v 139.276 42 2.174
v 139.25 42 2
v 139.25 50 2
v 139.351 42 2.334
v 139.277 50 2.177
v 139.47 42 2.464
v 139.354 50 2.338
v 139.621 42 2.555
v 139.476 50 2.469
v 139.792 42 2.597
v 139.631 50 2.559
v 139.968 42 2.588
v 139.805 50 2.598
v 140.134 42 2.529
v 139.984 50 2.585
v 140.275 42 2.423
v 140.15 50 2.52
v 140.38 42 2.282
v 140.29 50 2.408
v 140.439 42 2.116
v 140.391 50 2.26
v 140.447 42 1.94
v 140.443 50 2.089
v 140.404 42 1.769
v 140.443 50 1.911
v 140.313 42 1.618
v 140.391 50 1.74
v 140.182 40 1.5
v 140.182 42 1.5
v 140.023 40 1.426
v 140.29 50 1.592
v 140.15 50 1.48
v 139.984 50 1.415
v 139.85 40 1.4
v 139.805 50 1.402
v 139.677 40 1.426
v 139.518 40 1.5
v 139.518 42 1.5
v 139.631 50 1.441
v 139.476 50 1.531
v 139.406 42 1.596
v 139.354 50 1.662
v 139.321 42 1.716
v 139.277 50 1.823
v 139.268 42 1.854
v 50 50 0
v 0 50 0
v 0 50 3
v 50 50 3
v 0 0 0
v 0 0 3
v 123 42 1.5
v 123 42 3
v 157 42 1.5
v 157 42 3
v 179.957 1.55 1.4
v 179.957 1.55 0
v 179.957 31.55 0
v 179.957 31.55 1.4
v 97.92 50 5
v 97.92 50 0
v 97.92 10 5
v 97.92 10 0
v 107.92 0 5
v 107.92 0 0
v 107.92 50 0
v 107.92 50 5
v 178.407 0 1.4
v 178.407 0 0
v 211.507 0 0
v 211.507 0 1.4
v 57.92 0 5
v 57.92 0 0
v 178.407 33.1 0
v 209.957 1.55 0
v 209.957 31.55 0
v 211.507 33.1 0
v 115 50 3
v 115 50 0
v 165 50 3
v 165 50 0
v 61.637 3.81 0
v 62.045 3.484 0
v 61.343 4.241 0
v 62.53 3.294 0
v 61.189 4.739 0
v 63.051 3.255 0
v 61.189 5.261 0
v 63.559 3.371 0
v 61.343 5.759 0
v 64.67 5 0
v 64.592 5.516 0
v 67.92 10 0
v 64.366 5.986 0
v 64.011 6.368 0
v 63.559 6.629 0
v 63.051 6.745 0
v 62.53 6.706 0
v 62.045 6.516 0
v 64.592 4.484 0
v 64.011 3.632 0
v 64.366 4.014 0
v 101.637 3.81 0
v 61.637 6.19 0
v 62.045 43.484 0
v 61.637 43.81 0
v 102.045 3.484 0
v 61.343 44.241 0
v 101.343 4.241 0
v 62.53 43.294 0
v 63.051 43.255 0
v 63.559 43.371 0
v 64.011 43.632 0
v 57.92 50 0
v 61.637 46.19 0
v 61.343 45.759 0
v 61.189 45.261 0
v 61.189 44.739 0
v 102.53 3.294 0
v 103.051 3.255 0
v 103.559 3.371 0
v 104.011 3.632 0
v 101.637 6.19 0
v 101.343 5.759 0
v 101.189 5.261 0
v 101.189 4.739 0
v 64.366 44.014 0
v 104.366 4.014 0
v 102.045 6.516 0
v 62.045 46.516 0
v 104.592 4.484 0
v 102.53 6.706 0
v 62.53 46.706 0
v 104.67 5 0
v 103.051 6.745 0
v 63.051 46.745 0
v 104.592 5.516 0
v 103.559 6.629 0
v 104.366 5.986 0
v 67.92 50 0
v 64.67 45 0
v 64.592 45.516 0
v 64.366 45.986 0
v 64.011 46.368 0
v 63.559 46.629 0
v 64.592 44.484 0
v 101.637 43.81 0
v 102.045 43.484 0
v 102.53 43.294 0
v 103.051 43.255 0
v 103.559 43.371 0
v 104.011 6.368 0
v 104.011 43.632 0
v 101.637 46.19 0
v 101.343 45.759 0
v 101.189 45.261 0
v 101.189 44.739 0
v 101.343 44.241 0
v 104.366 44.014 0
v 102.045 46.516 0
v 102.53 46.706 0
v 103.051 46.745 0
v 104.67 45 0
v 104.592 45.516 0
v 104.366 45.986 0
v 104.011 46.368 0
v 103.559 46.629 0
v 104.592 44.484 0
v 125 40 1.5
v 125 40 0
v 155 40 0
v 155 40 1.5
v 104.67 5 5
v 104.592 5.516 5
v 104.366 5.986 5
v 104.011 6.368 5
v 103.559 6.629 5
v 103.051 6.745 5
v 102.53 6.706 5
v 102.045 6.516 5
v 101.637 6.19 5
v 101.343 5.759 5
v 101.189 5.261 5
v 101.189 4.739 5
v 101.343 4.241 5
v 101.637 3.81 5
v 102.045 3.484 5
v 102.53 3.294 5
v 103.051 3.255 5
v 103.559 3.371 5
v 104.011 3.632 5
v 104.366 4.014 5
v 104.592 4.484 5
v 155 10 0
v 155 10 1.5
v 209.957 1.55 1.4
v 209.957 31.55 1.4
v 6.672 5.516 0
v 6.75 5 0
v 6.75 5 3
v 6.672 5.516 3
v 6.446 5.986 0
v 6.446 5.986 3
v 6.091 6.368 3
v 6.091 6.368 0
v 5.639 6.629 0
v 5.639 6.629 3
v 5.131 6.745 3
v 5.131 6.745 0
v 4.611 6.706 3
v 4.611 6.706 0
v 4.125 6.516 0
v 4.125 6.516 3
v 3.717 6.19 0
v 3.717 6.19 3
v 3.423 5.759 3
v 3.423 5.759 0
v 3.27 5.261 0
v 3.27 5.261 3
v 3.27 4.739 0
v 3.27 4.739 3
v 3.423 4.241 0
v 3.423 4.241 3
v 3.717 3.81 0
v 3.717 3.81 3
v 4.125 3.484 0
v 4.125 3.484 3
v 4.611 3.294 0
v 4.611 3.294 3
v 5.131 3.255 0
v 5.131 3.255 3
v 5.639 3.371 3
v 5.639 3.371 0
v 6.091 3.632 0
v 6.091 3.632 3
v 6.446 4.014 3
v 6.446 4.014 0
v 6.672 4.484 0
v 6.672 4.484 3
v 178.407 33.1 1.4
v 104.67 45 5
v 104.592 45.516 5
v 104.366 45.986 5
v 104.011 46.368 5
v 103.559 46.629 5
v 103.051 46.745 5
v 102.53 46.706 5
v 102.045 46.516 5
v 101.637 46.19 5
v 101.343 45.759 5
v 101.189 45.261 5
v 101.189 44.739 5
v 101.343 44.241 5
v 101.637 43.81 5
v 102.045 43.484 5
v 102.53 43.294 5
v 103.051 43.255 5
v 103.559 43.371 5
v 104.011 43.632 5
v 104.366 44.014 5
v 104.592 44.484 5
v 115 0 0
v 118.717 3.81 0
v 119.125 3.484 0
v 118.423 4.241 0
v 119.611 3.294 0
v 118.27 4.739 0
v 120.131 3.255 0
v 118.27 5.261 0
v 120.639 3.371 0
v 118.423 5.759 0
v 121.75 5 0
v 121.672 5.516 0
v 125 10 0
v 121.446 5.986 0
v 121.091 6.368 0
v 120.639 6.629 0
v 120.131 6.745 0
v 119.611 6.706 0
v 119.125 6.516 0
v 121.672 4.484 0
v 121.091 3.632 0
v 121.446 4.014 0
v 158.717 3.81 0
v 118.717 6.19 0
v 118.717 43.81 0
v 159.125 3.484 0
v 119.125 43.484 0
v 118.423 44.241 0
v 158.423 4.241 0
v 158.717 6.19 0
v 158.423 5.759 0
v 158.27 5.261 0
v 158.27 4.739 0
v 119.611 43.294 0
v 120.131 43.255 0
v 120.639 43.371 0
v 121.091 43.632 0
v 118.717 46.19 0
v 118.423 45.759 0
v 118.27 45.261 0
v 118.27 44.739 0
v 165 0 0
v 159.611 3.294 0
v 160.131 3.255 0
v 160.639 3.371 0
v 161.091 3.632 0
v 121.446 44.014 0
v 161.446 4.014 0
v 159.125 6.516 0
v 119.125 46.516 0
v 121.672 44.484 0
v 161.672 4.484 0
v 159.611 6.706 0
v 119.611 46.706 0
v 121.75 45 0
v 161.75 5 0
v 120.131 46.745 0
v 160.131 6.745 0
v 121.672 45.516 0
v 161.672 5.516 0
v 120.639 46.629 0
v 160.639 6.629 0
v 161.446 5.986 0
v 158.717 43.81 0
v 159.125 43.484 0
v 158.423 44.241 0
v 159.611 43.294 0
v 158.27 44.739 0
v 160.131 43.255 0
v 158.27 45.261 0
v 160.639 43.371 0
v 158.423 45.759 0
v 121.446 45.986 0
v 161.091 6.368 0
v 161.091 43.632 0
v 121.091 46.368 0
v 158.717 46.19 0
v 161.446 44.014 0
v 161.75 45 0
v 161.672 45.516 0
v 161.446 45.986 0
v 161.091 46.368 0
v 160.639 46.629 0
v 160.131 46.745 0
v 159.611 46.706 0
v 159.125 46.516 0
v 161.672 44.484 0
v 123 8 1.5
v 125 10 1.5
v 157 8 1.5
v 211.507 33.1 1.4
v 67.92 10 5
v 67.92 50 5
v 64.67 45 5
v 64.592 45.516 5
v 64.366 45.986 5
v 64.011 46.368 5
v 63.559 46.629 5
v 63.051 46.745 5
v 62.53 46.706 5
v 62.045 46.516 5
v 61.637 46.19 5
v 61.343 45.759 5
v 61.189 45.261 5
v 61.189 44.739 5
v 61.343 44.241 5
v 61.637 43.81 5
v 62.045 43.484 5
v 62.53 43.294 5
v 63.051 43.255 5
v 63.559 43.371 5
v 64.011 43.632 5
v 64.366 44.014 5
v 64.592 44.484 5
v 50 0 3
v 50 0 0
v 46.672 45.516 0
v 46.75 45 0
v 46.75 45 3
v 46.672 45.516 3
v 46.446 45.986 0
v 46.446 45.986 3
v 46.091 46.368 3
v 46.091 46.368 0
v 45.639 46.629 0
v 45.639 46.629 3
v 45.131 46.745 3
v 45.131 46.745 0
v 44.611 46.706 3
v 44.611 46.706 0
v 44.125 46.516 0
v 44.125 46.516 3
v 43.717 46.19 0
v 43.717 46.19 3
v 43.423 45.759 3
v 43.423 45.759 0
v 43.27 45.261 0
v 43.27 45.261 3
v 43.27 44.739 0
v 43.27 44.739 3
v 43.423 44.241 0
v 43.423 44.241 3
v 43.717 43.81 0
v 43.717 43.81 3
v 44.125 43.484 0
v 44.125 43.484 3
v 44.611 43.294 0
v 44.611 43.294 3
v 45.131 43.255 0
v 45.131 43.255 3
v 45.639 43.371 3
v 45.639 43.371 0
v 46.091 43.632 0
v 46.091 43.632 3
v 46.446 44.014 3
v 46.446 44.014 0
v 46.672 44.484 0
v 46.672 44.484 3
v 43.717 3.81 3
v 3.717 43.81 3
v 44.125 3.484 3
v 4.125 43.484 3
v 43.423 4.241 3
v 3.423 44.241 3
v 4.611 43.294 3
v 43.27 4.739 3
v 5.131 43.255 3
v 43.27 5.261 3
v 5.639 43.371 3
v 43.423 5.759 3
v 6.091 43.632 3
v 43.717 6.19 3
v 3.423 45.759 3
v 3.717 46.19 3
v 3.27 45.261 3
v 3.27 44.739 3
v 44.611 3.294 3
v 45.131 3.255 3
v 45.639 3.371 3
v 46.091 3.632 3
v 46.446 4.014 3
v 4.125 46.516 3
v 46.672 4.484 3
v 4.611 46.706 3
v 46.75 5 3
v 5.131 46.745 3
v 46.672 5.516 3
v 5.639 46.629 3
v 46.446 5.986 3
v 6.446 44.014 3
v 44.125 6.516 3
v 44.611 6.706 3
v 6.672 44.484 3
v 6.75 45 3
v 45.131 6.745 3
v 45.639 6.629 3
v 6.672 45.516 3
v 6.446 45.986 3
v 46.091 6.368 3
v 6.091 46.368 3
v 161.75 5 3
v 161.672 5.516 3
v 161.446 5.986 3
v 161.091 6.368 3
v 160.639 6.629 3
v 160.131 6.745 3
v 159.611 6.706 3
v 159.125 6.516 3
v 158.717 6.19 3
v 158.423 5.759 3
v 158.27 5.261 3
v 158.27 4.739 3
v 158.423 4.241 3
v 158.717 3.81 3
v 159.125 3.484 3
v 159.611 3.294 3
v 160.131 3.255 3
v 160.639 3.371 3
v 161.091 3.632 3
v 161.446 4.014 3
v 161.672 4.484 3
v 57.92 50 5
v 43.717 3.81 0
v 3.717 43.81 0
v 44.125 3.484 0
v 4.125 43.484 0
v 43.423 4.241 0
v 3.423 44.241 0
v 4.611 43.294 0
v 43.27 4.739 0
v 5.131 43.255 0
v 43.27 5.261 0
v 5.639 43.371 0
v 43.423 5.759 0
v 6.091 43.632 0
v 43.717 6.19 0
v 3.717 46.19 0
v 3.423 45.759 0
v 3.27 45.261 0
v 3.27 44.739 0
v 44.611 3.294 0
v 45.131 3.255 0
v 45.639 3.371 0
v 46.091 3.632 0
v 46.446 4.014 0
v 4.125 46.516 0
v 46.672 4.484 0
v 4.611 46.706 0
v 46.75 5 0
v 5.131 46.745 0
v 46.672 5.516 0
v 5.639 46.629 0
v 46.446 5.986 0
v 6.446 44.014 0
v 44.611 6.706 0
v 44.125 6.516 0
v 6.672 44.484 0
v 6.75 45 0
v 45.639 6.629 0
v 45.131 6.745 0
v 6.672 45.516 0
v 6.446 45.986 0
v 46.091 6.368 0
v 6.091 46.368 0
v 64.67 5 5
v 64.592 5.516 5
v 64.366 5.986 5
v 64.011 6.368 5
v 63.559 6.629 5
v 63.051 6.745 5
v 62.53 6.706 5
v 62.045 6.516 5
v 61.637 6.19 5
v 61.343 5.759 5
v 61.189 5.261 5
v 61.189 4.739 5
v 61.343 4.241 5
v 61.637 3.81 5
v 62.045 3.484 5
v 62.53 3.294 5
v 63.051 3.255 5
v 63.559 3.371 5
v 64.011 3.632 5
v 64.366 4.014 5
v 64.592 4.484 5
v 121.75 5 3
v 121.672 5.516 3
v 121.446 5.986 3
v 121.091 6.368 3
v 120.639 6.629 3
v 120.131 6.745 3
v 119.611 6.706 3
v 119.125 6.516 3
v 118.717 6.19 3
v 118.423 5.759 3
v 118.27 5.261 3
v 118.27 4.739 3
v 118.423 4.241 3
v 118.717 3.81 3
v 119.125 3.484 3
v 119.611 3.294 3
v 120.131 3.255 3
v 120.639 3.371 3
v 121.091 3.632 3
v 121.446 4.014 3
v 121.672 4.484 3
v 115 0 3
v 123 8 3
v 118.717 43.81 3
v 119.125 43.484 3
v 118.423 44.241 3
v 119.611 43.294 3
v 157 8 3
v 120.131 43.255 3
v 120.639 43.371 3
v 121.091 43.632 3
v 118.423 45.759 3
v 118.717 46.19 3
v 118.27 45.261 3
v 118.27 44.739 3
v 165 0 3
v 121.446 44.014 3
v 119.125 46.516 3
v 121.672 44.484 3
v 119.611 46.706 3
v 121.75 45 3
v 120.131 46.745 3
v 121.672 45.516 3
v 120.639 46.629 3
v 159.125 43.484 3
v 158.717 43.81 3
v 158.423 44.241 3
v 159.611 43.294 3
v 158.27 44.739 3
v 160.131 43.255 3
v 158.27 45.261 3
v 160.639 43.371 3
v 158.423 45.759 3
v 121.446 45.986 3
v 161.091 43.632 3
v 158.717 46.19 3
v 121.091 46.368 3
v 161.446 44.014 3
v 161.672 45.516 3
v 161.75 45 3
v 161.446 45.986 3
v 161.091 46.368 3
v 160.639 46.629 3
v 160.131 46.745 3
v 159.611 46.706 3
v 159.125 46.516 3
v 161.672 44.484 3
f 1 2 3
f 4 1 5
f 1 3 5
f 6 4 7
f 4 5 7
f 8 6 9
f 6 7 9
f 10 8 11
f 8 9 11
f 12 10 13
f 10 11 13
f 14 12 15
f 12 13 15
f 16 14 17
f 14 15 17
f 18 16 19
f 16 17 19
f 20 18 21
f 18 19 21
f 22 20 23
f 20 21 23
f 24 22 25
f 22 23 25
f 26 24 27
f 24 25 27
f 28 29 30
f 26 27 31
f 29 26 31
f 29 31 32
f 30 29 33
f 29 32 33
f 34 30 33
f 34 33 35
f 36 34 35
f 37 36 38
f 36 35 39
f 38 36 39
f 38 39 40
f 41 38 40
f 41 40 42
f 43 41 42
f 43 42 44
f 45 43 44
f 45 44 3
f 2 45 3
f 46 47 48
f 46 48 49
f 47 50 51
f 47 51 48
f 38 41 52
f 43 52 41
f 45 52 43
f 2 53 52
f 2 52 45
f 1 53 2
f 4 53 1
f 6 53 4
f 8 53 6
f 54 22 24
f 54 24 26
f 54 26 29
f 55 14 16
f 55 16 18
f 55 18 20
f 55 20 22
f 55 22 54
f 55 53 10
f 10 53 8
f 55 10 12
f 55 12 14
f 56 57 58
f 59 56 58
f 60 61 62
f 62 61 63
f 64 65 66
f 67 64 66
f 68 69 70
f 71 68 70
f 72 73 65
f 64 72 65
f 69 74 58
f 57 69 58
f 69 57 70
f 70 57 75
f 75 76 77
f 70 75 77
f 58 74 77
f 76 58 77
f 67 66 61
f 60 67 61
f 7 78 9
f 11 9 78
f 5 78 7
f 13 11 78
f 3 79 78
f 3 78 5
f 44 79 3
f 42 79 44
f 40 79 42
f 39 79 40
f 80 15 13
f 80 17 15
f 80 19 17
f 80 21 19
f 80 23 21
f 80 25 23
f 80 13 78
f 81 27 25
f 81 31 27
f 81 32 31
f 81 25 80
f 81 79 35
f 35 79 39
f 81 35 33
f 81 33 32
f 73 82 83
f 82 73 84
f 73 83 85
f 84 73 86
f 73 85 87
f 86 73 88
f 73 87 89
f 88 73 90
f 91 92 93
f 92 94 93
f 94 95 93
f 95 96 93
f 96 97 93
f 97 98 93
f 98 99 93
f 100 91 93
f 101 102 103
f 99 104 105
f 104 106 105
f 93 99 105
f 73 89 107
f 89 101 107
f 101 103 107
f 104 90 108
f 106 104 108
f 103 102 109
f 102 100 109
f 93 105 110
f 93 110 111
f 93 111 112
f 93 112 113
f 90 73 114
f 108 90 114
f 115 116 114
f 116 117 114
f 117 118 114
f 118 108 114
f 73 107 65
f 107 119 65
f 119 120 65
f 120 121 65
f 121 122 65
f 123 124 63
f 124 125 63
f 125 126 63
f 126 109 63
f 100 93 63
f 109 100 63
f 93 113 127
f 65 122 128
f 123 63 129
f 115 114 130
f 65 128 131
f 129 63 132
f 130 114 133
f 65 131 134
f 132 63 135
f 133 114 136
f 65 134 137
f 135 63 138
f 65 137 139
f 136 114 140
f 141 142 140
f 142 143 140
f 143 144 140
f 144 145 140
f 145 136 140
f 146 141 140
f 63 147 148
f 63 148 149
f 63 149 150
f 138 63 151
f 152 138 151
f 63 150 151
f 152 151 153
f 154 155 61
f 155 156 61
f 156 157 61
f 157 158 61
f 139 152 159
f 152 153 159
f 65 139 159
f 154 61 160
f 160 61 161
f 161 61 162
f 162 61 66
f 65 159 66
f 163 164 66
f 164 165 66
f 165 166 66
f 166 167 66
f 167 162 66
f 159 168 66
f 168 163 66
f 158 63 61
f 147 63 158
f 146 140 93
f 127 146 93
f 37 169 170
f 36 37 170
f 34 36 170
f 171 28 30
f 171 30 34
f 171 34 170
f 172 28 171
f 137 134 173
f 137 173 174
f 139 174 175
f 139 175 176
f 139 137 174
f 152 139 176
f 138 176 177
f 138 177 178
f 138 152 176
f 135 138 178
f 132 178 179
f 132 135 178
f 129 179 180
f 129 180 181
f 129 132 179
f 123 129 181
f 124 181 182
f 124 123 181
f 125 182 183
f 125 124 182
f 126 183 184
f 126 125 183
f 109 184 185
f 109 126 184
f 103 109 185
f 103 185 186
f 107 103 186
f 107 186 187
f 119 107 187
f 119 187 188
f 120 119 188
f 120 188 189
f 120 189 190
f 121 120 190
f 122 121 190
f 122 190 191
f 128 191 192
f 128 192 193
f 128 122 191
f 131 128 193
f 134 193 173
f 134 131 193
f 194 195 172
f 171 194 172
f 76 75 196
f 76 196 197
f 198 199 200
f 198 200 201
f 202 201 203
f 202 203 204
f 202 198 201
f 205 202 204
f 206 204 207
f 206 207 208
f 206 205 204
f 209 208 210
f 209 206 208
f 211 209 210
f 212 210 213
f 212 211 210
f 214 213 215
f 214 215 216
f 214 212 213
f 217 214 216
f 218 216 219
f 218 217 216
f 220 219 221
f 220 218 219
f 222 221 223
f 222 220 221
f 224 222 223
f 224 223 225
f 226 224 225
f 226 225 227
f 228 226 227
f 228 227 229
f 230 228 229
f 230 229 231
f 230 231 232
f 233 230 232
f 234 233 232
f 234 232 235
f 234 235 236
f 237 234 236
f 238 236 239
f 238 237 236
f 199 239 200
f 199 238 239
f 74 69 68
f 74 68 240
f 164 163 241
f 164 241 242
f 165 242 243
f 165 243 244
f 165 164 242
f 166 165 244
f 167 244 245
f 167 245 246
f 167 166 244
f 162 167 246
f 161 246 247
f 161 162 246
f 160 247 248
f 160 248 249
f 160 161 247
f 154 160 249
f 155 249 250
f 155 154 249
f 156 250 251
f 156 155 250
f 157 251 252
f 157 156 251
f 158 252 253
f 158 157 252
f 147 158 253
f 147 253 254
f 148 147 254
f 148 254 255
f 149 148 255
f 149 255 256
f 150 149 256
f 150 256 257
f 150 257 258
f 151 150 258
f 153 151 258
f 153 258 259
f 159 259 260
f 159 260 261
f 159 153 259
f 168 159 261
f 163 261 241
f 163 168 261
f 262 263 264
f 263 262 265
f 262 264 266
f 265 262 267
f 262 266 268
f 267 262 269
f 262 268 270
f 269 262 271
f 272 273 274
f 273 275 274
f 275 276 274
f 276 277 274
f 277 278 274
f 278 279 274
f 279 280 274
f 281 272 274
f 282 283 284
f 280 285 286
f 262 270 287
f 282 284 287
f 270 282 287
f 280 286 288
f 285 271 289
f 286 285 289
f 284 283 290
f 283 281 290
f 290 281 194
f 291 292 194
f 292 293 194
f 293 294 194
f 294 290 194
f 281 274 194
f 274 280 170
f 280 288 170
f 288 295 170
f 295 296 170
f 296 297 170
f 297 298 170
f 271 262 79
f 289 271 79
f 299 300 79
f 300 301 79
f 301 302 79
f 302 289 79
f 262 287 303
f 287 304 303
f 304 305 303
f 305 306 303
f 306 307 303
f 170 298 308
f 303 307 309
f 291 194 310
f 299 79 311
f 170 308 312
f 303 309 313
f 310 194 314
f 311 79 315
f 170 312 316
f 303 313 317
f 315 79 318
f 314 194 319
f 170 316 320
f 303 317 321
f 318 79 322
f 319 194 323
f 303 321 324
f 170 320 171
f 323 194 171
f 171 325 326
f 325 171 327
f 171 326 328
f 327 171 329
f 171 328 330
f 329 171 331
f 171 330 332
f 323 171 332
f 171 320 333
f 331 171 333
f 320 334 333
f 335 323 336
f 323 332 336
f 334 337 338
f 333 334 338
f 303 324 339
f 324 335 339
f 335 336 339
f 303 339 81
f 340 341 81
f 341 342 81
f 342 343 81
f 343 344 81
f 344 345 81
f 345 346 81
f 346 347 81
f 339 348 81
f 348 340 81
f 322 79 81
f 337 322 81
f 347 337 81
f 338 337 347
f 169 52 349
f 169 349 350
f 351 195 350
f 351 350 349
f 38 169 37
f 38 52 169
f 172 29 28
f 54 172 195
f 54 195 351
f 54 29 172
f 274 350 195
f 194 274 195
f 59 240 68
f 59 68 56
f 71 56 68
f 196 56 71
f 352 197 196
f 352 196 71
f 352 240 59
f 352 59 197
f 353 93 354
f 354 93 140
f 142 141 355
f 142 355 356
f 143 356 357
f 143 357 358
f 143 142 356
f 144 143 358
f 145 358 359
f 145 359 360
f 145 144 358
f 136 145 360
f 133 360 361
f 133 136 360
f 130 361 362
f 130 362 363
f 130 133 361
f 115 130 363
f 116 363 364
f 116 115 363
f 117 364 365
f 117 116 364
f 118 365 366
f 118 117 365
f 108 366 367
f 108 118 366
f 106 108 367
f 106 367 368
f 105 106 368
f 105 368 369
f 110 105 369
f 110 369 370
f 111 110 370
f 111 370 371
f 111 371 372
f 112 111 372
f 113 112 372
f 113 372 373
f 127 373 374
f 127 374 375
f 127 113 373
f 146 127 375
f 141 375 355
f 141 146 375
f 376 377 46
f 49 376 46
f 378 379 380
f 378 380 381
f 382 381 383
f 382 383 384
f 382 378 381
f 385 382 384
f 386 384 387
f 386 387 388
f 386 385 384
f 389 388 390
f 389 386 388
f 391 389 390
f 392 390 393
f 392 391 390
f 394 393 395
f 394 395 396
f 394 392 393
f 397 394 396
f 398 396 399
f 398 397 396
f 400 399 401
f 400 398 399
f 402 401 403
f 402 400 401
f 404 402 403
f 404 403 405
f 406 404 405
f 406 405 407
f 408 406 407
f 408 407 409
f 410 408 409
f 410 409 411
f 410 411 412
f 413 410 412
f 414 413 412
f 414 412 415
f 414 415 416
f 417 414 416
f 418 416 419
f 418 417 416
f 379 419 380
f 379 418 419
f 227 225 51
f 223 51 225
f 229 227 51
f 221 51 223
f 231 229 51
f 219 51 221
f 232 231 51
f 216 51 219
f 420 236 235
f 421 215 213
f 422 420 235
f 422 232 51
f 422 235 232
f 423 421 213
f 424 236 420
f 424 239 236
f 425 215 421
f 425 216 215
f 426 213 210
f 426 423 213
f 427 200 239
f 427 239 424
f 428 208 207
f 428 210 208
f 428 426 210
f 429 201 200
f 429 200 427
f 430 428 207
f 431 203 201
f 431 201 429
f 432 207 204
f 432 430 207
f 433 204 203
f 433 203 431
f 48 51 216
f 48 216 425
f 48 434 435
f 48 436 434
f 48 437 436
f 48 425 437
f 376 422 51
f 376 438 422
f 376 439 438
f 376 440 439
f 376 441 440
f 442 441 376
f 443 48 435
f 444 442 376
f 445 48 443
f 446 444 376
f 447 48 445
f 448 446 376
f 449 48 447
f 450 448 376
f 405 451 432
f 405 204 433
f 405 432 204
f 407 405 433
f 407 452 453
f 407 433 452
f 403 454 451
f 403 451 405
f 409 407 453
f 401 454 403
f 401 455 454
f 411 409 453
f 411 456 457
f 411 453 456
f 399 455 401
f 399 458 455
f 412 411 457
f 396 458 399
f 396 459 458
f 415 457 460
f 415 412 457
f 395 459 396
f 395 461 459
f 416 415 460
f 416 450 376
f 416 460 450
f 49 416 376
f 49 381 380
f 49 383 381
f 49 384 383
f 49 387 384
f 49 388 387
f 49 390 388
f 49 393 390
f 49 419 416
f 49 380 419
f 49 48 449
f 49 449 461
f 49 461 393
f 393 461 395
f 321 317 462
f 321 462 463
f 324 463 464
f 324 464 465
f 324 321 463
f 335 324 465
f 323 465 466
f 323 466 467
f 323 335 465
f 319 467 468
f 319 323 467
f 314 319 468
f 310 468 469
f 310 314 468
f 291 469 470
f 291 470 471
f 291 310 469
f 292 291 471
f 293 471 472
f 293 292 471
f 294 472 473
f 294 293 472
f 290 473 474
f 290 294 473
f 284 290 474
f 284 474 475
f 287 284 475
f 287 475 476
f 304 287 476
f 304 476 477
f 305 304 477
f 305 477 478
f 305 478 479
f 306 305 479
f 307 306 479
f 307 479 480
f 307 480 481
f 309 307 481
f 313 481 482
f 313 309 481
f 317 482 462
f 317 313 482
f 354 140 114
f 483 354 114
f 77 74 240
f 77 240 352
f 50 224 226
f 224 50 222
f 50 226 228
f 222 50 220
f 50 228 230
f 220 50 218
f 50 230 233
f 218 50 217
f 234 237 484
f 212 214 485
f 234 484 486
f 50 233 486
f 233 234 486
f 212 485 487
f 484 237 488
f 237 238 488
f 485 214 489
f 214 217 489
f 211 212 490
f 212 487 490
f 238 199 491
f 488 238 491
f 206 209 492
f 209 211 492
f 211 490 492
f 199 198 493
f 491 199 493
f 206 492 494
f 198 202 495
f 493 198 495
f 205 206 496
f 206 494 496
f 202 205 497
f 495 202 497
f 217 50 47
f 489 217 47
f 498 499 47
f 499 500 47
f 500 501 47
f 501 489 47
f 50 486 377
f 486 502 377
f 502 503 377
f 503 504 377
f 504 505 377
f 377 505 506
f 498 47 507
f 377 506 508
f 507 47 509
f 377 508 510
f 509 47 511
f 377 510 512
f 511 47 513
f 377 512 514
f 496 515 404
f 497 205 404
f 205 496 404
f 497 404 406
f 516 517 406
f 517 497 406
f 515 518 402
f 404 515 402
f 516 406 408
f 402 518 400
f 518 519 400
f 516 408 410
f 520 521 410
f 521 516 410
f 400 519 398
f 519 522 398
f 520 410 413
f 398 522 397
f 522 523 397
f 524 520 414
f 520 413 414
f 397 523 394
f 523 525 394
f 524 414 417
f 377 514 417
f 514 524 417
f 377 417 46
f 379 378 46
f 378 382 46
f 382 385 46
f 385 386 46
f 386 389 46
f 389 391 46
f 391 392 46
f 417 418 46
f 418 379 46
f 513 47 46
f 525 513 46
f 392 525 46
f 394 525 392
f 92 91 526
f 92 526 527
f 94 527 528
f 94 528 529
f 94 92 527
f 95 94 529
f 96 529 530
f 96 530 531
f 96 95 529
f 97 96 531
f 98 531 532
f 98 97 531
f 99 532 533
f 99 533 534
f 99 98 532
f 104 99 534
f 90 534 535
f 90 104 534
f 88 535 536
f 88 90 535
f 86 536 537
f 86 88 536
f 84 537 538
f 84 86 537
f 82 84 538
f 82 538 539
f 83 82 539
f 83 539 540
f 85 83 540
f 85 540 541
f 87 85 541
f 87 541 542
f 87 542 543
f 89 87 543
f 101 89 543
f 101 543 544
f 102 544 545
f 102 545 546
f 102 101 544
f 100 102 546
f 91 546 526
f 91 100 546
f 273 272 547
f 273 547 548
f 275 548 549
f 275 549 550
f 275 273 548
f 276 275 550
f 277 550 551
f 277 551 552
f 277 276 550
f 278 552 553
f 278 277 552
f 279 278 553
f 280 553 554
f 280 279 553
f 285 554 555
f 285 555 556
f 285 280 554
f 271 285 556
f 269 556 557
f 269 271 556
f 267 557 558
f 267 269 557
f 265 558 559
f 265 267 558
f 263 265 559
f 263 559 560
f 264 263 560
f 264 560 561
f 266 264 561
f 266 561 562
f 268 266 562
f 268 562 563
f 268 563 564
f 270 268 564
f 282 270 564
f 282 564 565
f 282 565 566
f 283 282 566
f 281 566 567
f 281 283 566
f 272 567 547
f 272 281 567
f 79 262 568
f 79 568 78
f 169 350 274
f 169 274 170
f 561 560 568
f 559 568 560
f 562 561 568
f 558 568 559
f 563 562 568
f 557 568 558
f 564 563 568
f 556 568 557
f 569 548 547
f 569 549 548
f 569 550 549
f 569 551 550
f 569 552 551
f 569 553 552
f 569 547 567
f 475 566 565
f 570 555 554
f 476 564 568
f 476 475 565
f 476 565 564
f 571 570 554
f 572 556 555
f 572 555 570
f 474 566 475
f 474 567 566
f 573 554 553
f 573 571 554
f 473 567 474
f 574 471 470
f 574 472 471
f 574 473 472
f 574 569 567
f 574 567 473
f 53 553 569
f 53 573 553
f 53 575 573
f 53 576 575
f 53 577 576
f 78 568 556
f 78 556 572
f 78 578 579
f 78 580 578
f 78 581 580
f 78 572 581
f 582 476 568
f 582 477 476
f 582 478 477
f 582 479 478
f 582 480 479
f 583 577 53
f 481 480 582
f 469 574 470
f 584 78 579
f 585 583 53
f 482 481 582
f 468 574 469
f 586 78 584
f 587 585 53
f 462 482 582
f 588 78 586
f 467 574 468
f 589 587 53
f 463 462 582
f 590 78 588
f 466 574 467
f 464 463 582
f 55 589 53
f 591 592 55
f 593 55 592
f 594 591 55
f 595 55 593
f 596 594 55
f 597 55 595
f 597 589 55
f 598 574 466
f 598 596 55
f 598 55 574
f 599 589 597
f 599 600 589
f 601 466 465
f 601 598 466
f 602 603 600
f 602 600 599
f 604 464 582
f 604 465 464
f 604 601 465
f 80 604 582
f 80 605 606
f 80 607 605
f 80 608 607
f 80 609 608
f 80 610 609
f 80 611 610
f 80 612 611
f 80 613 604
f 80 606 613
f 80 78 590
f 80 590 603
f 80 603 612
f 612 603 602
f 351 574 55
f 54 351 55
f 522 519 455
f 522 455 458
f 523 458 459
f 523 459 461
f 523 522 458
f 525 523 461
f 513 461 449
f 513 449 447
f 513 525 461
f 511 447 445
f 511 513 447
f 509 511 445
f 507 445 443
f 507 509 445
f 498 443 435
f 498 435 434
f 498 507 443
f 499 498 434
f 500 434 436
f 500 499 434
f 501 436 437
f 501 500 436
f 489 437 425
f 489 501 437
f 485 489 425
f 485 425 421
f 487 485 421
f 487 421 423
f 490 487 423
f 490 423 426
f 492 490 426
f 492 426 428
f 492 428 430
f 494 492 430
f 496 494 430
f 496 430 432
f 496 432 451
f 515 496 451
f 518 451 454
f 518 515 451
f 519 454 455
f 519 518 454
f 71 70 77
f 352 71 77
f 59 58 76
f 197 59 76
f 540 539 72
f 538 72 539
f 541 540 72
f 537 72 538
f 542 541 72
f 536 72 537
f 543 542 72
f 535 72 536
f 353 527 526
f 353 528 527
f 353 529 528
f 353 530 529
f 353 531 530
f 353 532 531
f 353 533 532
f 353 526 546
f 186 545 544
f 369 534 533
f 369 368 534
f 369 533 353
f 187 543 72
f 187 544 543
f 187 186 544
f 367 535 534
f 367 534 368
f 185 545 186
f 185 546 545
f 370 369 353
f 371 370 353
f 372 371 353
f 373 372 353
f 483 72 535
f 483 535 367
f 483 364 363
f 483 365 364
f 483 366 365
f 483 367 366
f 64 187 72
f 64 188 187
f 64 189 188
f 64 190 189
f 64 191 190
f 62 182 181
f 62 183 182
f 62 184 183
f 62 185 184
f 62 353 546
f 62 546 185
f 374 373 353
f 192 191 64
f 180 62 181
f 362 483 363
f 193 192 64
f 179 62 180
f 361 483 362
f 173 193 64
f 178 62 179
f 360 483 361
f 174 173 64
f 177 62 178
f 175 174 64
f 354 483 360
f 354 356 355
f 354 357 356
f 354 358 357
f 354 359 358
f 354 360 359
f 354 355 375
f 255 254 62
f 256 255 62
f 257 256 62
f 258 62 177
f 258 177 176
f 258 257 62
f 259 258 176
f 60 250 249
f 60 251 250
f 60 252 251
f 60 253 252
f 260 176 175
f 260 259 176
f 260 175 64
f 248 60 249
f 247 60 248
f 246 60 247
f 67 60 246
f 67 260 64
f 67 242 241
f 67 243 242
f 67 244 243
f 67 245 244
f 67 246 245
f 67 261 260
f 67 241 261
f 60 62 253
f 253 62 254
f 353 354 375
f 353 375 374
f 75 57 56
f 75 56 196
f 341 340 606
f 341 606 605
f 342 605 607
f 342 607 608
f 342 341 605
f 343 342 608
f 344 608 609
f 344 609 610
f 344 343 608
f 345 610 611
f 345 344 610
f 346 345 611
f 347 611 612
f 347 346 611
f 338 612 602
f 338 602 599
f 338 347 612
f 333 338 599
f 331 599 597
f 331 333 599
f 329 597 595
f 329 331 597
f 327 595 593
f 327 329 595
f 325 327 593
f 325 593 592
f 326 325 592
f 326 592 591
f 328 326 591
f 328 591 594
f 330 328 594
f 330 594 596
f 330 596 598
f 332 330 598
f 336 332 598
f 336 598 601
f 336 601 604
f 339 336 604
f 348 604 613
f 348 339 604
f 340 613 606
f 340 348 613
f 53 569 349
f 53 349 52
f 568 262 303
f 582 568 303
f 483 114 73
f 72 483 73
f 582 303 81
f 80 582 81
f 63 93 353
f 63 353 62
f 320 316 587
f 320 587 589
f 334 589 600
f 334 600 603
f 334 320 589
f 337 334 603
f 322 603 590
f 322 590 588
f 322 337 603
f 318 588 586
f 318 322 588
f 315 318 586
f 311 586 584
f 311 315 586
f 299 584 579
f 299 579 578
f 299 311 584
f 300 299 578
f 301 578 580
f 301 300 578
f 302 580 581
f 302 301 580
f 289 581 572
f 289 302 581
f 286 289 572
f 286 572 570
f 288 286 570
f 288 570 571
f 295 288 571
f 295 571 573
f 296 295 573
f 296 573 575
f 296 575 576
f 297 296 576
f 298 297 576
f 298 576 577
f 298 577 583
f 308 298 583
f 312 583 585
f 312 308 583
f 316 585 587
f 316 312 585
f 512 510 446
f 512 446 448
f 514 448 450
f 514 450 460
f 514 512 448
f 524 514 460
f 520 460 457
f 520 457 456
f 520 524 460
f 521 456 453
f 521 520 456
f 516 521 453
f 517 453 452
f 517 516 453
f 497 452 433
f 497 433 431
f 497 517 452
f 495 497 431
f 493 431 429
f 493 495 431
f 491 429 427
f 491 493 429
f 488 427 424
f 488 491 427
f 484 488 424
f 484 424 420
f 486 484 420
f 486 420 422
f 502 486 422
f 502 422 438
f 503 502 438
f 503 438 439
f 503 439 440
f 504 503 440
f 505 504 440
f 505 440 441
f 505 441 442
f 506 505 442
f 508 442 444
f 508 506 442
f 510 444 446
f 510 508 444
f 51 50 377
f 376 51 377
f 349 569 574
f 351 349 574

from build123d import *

# Parameters (mm, degrees)
F0_W      = 50
F0_H      = 50
F0_R      = 1.75
F1_DEPTH  = 3
F2_R      = 1.75
F2_W      = 30
F2_H      = 10
F3_DEPTH  = 5
F5_W      = 30
F5_H      = 30
F6_DEPTH  = 3.001
F7_W      = 34
F7_H      = 34
F8_DEPTH  = 1.5
F9_W      = 33.1
F9_H      = 33.1
F9_W_2    = 30
F9_H_2    = 30
F10_DEPTH = 1.4
F11_R     = 0.6
F12_DEPTH = 25


with BuildPart() as f1:
    # F0 (on Top) → F1 (new body)
    with BuildSketch(Plane.XY):
        with Locations((25, 25)):
            Rectangle(F0_W, F0_H)
        with Locations((5, 5)):
            Circle(F0_R, mode=Mode.SUBTRACT)
        with Locations((45, 5)):
            Circle(F0_R, mode=Mode.SUBTRACT)
        with Locations((5, 45)):
            Circle(F0_R, mode=Mode.SUBTRACT)
        with Locations((45, 45)):
            Circle(F0_R, mode=Mode.SUBTRACT)
    extrude(amount=F1_DEPTH)


with BuildPart() as f3:
    # F2 (on Top) → F3 (new body)
    with BuildSketch(Plane.XY):
        Polygon((67.919823, 50), (57.919823, 50), (57.919823, 0), (67.919823, 0), (67.919823, 10), align=None)
        with Locations((62.919823, 5)):
            Circle(F2_R, mode=Mode.SUBTRACT)
        with Locations((62.919823, 45)):
            Circle(F2_R, mode=Mode.SUBTRACT)
        with Locations((82.919823, 5)):
            Rectangle(F2_W, F2_H)
        Polygon((97.919823, 50), (97.919823, 10), (97.919823, 0), (107.919823, 0), (107.919823, 50), align=None)
        with Locations((102.919823, 5)):
            Circle(F2_R, mode=Mode.SUBTRACT)
        with Locations((102.919823, 45)):
            Circle(F2_R, mode=Mode.SUBTRACT)
    extrude(amount=F3_DEPTH)


with BuildPart() as f4_1:
    # F4: copy of F1
    add(f1.part.moved(Location((115, 0, 0))))

    # F5 (on face) → F6 (cut, through all)
    with BuildSketch(Plane.XY.offset(3)):
        with Locations((140, 25)):
            Rectangle(F5_W, F5_H)
    extrude(amount=-F6_DEPTH, mode=Mode.SUBTRACT)

    # F7 (on face) → F8 (cut)
    with BuildSketch(Plane.XY.offset(3)):
        with Locations((140, 25)):
            Rectangle(F7_W, F7_H)
    extrude(amount=-F8_DEPTH, mode=Mode.SUBTRACT)

    # F11 (on face) → F12 (cut)
    with BuildSketch(Plane(origin=(0, 50, 0), x_dir=(-1, 0, 0), z_dir=(0, 1, 0))):
        with Locations((-139.85, 2)):
            Circle(F11_R)
    extrude(amount=-F12_DEPTH, mode=Mode.SUBTRACT)


with BuildPart() as f10:
    # F9 (on Top) → F10 (new body)
    with BuildSketch(Plane.XY):
        with Locations((194.956502, 16.55)):
            Rectangle(F9_W, F9_H)
        with Locations((194.956502, 16.55)):
            Rectangle(F9_W_2, F9_H_2, mode=Mode.SUBTRACT)
    extrude(amount=F10_DEPTH)


solid = Compound([f1.part, f3.part, f4_1.part, f10.part])
